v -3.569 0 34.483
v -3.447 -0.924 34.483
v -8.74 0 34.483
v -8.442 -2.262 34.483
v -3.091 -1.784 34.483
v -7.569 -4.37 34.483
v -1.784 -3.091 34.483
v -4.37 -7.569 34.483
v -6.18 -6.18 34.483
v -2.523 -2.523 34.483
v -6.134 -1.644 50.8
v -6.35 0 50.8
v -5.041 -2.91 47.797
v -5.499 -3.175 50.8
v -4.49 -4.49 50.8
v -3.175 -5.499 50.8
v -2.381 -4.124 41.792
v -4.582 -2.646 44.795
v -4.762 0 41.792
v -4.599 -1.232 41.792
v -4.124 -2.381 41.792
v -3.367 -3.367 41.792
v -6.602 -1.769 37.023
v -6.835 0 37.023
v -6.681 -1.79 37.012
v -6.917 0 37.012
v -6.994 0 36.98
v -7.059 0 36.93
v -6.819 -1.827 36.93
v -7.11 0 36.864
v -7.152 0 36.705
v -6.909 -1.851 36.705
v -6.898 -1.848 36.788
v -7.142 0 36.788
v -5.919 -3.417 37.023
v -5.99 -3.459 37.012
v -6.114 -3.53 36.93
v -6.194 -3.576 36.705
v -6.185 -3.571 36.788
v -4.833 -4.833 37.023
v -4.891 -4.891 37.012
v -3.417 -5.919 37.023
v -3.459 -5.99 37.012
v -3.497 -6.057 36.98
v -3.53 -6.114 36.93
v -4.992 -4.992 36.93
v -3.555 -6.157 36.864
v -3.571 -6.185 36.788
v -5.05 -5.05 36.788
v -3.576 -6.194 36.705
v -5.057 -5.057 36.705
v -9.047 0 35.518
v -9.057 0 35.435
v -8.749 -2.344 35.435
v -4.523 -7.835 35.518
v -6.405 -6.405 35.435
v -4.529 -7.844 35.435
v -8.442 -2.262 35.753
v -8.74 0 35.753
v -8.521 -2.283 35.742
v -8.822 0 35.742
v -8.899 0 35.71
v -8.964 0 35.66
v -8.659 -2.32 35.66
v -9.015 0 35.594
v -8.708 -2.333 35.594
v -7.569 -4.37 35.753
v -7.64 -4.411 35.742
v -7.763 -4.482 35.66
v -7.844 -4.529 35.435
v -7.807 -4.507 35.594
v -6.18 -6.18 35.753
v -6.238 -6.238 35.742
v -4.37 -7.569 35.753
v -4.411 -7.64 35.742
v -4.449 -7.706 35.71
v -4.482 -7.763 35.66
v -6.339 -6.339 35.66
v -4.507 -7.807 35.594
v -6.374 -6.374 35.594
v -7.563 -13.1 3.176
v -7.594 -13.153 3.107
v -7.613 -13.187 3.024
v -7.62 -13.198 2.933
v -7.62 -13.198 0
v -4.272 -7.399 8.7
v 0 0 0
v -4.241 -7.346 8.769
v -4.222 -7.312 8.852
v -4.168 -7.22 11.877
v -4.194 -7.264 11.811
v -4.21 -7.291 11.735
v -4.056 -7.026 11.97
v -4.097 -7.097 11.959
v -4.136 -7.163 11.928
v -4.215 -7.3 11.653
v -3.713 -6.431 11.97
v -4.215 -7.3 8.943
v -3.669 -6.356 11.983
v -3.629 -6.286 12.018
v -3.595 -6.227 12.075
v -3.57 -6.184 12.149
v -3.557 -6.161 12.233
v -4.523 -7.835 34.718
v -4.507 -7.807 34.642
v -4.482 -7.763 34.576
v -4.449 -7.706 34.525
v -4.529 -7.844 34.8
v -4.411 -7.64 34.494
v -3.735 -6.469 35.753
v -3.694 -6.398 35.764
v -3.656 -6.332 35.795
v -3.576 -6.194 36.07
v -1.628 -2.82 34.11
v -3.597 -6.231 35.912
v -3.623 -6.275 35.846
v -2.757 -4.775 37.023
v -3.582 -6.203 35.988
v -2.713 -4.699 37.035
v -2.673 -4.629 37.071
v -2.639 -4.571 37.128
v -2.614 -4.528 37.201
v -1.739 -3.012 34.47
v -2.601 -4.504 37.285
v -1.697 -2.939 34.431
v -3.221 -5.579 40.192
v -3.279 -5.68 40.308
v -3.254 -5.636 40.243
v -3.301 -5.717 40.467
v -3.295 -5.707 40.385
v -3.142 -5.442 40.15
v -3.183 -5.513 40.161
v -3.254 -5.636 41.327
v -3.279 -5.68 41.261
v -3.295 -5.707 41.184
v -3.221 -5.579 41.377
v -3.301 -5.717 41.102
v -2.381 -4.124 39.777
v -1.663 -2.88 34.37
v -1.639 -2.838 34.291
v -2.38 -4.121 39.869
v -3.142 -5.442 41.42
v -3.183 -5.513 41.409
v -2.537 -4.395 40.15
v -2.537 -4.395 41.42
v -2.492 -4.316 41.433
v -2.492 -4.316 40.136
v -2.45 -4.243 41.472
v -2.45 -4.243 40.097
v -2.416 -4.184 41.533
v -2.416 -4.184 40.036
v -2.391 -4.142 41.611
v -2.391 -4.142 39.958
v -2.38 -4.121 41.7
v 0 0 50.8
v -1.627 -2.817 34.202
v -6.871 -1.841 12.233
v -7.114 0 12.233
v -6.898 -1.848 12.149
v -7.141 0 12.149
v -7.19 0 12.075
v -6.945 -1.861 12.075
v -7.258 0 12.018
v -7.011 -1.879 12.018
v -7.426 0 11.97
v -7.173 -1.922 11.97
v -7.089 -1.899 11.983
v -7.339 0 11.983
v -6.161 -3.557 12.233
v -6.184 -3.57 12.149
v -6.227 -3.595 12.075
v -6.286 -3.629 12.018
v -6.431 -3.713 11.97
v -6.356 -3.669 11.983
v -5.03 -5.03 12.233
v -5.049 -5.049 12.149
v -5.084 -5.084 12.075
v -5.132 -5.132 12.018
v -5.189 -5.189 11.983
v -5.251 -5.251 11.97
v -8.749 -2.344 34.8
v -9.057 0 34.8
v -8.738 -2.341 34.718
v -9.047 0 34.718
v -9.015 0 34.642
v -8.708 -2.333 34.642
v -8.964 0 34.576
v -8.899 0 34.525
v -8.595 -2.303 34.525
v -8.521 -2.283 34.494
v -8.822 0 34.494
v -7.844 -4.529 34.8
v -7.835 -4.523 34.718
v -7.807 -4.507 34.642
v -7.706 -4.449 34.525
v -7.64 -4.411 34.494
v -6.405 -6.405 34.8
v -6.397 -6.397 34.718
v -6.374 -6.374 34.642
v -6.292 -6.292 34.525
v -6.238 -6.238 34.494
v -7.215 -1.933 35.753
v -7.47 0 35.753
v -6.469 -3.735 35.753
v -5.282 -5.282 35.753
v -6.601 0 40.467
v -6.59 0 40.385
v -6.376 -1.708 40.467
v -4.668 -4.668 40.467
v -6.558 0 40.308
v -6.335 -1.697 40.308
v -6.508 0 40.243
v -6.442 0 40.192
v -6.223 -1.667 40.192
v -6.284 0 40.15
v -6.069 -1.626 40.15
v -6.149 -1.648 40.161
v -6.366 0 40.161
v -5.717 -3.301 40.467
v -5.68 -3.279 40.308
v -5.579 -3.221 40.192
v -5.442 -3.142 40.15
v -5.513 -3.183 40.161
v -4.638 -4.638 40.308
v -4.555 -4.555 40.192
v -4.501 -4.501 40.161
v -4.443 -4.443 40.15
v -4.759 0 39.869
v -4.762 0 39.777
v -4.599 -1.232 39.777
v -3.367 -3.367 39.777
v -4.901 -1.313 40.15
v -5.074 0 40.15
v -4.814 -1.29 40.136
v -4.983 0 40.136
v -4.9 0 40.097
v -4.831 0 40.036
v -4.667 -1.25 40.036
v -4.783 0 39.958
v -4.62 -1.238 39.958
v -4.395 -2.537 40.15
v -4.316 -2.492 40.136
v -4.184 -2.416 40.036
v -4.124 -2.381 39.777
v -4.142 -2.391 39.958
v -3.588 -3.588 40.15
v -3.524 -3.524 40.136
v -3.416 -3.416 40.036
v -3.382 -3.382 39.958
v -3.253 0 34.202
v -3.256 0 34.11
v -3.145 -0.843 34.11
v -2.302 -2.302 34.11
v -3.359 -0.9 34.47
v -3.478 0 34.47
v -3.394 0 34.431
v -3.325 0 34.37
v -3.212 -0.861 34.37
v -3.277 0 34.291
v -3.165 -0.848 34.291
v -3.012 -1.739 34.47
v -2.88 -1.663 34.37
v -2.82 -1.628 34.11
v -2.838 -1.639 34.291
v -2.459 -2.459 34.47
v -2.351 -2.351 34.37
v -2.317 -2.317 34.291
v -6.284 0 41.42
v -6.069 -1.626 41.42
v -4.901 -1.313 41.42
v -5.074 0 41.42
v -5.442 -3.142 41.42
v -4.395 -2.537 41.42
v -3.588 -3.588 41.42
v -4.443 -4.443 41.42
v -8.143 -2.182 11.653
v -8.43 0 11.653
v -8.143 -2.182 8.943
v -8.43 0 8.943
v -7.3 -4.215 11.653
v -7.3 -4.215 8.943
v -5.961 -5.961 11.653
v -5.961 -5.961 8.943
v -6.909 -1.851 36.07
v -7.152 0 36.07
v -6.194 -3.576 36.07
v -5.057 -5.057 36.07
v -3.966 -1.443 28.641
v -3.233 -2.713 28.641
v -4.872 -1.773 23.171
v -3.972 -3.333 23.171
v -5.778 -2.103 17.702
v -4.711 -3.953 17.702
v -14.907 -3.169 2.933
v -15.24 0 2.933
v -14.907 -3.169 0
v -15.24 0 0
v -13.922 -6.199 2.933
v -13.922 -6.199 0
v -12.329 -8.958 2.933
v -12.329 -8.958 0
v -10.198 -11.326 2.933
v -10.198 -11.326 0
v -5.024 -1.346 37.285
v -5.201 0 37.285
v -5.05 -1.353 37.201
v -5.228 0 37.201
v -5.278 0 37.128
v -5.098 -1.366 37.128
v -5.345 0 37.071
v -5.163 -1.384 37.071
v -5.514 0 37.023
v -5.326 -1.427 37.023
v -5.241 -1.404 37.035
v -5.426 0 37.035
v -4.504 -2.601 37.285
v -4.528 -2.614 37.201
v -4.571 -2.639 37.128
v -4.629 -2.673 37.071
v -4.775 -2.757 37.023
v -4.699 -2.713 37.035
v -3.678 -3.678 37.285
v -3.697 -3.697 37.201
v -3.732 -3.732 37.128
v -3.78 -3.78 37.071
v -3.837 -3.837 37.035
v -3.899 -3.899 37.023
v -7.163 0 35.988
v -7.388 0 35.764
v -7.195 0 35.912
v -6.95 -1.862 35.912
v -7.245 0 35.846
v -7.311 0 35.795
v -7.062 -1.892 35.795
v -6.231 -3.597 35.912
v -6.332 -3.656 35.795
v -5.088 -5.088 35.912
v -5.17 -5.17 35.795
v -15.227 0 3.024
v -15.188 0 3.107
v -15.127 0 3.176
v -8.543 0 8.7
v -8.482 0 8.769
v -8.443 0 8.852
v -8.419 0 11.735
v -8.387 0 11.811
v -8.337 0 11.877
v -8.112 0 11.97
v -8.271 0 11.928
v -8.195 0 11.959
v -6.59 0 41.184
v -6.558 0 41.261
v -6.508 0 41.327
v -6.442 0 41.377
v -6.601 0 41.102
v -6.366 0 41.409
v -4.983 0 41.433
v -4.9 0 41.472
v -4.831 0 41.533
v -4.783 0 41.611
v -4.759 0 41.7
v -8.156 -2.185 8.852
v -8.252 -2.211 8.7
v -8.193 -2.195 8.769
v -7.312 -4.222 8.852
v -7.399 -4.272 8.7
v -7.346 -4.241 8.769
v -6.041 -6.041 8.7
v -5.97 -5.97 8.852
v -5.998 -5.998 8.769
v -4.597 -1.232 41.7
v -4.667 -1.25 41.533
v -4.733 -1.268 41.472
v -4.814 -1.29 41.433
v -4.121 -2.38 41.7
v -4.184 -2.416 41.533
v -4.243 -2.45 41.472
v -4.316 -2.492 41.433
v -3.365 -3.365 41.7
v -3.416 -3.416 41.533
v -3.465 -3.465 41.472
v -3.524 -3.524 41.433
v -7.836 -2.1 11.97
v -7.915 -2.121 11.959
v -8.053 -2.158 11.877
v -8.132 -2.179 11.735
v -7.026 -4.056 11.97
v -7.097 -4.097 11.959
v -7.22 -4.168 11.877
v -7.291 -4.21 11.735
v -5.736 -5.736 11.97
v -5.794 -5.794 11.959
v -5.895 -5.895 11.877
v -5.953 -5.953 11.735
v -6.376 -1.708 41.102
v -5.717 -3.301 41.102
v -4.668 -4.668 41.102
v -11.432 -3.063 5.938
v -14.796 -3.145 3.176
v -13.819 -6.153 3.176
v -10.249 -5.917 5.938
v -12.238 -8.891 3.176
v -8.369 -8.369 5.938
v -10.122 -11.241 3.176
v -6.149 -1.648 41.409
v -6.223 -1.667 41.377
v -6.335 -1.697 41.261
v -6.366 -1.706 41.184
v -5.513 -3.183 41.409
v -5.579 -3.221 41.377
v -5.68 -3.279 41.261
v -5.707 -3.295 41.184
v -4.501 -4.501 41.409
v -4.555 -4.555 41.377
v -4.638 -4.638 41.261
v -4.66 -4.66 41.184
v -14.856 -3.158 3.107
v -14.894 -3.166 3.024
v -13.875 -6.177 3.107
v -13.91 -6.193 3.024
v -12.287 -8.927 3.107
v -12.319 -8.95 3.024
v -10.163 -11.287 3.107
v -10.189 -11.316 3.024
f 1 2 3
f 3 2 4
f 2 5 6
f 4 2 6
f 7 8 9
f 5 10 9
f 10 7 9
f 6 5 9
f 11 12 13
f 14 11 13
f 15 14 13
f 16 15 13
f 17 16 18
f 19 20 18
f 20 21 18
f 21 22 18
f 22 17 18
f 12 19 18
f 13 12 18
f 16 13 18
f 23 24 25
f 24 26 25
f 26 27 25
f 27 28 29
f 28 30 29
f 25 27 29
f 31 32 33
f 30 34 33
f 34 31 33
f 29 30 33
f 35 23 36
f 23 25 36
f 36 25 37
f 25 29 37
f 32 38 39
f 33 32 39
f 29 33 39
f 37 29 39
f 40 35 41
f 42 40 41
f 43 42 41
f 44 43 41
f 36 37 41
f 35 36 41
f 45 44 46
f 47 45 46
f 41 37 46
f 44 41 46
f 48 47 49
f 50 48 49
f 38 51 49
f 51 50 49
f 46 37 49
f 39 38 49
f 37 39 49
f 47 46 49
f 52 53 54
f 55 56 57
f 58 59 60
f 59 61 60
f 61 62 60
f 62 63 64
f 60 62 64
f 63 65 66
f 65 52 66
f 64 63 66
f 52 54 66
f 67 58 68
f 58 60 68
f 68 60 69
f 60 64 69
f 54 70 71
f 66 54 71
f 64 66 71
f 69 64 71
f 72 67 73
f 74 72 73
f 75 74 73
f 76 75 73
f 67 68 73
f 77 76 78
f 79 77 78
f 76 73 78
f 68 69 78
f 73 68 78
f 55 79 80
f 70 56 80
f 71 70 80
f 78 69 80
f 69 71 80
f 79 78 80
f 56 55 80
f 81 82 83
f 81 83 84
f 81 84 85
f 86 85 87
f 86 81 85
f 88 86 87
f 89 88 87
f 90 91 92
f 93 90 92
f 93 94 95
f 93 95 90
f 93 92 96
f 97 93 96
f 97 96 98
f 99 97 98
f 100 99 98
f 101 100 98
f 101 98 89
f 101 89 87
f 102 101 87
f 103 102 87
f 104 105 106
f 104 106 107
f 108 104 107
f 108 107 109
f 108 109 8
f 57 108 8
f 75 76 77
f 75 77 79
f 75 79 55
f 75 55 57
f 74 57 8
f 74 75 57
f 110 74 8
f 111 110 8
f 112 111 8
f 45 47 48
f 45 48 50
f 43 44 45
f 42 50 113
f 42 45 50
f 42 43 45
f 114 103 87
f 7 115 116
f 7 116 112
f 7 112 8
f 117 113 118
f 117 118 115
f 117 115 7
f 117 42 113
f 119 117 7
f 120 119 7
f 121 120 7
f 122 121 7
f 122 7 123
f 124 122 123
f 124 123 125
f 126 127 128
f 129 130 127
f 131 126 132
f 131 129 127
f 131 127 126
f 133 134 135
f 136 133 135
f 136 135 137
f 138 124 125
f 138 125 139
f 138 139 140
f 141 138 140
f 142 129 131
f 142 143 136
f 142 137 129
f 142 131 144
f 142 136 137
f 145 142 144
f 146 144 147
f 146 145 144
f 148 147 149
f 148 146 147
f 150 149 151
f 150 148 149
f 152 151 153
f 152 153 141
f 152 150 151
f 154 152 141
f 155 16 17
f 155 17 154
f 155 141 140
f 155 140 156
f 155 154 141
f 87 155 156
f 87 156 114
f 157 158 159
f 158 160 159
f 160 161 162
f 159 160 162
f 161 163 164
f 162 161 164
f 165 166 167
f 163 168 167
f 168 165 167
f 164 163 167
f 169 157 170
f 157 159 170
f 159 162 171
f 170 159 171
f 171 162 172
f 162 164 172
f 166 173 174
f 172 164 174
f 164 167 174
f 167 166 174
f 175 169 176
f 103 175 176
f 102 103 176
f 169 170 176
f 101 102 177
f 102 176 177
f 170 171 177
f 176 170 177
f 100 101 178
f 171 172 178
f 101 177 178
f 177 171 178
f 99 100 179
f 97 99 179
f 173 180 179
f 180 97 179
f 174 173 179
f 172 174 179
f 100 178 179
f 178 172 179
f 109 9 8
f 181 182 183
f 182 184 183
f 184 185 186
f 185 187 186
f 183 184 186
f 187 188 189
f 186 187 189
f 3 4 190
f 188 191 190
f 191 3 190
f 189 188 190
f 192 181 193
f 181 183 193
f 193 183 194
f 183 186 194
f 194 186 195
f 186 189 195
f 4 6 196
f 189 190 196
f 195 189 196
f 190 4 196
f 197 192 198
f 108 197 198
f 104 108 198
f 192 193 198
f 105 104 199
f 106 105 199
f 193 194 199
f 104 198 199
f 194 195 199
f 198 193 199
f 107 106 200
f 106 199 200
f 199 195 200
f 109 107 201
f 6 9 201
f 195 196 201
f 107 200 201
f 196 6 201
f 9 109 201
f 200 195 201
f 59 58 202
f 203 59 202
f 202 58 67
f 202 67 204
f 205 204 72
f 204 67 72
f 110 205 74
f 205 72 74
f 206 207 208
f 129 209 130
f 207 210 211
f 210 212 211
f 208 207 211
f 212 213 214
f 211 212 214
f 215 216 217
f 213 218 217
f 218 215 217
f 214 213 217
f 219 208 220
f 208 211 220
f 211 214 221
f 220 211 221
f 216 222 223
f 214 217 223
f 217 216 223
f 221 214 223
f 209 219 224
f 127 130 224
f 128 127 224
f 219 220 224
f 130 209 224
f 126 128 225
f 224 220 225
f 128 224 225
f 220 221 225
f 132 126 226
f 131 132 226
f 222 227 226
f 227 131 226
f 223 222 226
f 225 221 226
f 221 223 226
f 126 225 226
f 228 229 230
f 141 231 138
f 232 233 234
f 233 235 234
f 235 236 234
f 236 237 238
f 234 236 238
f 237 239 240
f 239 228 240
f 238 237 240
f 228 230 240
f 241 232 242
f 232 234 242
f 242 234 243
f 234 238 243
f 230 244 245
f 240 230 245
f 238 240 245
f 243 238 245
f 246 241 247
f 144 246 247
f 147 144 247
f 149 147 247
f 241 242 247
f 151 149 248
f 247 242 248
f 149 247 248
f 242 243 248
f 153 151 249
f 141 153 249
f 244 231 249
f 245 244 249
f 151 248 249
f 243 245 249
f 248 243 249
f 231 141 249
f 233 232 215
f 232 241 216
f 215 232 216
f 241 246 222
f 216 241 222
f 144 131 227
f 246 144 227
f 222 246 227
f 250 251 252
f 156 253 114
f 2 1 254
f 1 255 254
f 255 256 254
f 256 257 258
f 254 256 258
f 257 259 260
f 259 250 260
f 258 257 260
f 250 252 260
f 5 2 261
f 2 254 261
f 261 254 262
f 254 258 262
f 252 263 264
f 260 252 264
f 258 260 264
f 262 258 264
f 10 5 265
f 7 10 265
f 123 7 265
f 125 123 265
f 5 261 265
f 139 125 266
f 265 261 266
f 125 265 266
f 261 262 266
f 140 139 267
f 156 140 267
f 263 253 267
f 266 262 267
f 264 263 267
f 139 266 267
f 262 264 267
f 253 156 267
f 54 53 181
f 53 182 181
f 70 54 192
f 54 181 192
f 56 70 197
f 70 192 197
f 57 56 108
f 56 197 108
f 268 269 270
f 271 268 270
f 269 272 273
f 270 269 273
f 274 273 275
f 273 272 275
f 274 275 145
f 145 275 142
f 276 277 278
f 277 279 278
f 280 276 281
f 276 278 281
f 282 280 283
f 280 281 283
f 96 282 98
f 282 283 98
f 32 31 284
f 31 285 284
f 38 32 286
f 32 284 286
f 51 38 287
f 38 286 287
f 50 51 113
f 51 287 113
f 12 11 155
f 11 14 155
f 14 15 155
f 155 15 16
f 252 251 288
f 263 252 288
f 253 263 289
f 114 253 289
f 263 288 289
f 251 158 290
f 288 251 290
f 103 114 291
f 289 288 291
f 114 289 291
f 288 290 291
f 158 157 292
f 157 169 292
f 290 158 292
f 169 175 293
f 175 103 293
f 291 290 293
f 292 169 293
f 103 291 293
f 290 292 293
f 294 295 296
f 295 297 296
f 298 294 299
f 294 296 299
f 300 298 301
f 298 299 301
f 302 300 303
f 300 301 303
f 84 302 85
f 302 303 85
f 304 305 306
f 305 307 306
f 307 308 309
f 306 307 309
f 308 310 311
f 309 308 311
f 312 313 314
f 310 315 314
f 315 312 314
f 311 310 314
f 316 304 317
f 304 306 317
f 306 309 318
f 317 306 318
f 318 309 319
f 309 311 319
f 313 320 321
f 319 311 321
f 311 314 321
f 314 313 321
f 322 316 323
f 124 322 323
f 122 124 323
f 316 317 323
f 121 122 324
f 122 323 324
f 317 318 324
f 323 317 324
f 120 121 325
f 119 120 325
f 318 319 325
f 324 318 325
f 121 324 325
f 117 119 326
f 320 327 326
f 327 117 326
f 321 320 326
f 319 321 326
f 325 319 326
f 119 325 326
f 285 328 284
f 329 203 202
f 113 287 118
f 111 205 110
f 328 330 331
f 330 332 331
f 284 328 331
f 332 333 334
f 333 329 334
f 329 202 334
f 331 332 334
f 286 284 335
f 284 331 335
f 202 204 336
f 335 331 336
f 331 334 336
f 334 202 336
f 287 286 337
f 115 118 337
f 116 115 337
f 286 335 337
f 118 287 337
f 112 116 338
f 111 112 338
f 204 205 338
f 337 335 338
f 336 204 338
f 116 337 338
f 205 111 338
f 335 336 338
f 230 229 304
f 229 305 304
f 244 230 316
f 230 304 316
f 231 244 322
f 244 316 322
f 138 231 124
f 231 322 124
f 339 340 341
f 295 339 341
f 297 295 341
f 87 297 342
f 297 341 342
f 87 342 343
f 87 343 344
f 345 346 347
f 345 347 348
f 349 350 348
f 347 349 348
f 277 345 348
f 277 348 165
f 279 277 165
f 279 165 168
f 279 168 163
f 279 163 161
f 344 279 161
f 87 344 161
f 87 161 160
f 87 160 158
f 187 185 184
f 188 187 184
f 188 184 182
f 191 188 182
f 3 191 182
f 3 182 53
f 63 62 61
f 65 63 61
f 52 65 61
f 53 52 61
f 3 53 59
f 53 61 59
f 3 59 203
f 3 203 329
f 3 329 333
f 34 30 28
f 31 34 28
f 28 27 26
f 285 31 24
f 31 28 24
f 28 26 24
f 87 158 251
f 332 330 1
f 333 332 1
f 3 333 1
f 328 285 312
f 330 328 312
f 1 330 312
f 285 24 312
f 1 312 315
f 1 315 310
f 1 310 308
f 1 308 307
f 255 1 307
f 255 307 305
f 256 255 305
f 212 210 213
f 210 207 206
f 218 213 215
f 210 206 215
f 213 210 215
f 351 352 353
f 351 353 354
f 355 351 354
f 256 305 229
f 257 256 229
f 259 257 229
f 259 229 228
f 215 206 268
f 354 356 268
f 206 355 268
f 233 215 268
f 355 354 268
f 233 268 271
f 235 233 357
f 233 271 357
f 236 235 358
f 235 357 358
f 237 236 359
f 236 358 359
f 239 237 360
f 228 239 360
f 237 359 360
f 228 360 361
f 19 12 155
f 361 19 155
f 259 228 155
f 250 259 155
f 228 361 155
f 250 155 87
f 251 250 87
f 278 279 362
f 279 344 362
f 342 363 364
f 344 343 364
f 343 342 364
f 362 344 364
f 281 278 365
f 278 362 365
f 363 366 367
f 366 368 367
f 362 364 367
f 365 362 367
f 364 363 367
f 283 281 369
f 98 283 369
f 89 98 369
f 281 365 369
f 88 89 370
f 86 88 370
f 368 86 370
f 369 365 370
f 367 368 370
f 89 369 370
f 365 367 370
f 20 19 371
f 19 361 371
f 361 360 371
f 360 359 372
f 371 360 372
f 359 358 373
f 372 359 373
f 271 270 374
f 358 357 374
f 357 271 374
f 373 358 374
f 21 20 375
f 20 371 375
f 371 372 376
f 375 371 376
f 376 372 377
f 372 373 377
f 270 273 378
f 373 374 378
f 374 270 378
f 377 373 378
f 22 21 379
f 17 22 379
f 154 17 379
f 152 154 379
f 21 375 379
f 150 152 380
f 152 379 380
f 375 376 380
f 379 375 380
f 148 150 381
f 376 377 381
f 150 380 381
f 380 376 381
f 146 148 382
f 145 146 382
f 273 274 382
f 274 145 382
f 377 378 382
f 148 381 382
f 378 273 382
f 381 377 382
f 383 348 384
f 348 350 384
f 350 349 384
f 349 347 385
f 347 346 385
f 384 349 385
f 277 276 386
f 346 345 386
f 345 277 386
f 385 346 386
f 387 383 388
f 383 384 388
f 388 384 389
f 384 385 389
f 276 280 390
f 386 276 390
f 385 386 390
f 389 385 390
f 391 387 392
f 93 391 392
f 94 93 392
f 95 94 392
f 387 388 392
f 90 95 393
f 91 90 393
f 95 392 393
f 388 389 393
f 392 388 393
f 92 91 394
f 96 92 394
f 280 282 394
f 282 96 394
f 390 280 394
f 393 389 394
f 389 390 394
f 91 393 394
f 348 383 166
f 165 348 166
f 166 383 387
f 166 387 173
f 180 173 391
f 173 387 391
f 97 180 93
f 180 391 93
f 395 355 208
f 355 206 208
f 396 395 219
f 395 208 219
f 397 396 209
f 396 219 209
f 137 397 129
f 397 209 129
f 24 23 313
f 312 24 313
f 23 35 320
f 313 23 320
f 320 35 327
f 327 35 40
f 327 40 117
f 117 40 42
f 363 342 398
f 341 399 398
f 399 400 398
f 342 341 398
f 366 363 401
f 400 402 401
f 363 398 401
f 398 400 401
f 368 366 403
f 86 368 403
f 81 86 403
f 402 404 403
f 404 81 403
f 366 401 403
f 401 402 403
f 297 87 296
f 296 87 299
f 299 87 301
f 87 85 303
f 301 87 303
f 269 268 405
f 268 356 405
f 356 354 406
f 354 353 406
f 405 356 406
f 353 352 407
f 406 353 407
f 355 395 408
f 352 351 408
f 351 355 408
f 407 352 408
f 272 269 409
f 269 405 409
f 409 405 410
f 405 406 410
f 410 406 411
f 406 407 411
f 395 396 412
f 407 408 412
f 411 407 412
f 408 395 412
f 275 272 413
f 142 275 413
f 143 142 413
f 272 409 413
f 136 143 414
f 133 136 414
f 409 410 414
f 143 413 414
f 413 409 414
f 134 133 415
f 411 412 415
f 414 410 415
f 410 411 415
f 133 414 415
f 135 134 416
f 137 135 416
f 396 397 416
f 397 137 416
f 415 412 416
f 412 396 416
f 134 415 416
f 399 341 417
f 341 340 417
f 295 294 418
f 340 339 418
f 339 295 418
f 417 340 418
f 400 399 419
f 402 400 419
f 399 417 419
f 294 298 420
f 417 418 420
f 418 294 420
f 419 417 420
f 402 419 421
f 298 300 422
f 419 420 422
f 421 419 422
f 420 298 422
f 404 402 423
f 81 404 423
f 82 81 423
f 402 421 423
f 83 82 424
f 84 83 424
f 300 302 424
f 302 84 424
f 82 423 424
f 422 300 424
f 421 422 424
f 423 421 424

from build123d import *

# Parameters (mm, degrees)
F1_ANGLE = 60


# Not quite as in the source:
# - a feature of the source that left no trace in its solid (it failed there, or was rolled back) is left out


with BuildPart() as f1:
    # F0 (on Front) → F1 (revolve)
    with BuildSketch(Plane.XZ):
        with BuildLine():
            Line((-15.24, 0), (0, 0))
            Line((0, 0), (0, 50.8))
            Line((0, 50.8), (-6.35, 50.8))
            Line((-6.35, 50.8), (-4.7617064118, 41.792339449))
            ThreePointArc((-4.7617064118, 41.792339449), (-4.8311637627, 41.5331210865), (-5.0743828734, 41.4197061526))
            Line((-5.0743828734, 41.4197061526), (-6.2835011077, 41.4197061526))
            ThreePointArc((-6.2835011077, 41.4197061526), (-6.5080075107, 41.3267125556), (-6.6010011077, 41.1022061526))
            Line((-6.6010011077, 41.1022061526), (-6.6010011077, 40.4672061526))
            ThreePointArc((-6.6010011077, 40.4672061526), (-6.5080075107, 40.2426997495), (-6.2835011077, 40.1497061526))
            Line((-6.2835011077, 40.1497061526), (-5.0743828734, 40.1497061526))
            ThreePointArc((-5.0743828734, 40.1497061526), (-4.8311637627, 40.0362912186), (-4.7617064118, 39.7770728561))
            Line((-4.7617064118, 39.7770728561), (-5.2010717431, 37.2853082403))
            ThreePointArc((-5.2010717431, 37.2853082403), (-5.3096631386, 37.0972224261), (-5.5137482047, 37.0229415367))
            Line((-5.5137482047, 37.0229415367), (-6.8348340718, 37.0229415367))
            ThreePointArc((-6.8348340718, 37.0229415367), (-7.0593404748, 36.9299479398), (-7.1523340718, 36.7054415367))
            Line((-7.1523340718, 36.7054415367), (-7.1523340718, 36.0704415367))
            ThreePointArc((-7.1523340718, 36.0704415367), (-7.2453276688, 35.8459351337), (-7.4698340718, 35.7529415367))
            Line((-7.4698340718, 35.7529415367), (-8.7398340718, 35.7529415367))
            ThreePointArc((-8.7398340718, 35.7529415367), (-8.9643404748, 35.6599479398), (-9.0573340718, 35.4354415367))
            Line((-9.0573340718, 35.4354415367), (-9.0573340718, 34.8004415367))
            ThreePointArc((-9.0573340718, 34.8004415367), (-8.9643404748, 34.5759351337), (-8.7398340718, 34.4829415367))
            Line((-8.7398340718, 34.4829415367), (-3.5686493249, 34.4829415367))
            ThreePointArc((-3.5686493249, 34.4829415367), (-3.3254302142, 34.3695266028), (-3.2559728633, 34.1103082403))
            Line((-3.2559728633, 34.1103082403), (-7.113602572, 12.2326030065))
            ThreePointArc((-7.113602572, 12.2326030065), (-7.2221939675, 12.0445171922), (-7.4262790336, 11.9702363029))
            Line((-7.4262790336, 11.9702363029), (-8.1123649007, 11.9702363029))
            ThreePointArc((-8.1123649007, 11.9702363029), (-8.3368713037, 11.8772427059), (-8.4298649007, 11.6527363029))
            Line((-8.4298649007, 11.6527363029), (-8.4298649007, 8.9432889844))
            ThreePointArc((-8.4298649007, 8.9432889844), (-8.4596121783, 8.8091076862), (-8.5432798346, 8.7000698737))
            Line((-8.5432798346, 8.7000698737), (-15.1265850661, 3.176020882))
            ThreePointArc((-15.1265850661, 3.176020882), (-15.2102527224, 3.0669830694), (-15.24, 2.9328017713))
            Line((-15.24, 2.9328017713), (-15.24, 0))
        make_face()
    revolve(axis=Axis((0, 0, 25.4), (0, 0, 1)), revolution_arc=F1_ANGLE)


solid = f1.part
